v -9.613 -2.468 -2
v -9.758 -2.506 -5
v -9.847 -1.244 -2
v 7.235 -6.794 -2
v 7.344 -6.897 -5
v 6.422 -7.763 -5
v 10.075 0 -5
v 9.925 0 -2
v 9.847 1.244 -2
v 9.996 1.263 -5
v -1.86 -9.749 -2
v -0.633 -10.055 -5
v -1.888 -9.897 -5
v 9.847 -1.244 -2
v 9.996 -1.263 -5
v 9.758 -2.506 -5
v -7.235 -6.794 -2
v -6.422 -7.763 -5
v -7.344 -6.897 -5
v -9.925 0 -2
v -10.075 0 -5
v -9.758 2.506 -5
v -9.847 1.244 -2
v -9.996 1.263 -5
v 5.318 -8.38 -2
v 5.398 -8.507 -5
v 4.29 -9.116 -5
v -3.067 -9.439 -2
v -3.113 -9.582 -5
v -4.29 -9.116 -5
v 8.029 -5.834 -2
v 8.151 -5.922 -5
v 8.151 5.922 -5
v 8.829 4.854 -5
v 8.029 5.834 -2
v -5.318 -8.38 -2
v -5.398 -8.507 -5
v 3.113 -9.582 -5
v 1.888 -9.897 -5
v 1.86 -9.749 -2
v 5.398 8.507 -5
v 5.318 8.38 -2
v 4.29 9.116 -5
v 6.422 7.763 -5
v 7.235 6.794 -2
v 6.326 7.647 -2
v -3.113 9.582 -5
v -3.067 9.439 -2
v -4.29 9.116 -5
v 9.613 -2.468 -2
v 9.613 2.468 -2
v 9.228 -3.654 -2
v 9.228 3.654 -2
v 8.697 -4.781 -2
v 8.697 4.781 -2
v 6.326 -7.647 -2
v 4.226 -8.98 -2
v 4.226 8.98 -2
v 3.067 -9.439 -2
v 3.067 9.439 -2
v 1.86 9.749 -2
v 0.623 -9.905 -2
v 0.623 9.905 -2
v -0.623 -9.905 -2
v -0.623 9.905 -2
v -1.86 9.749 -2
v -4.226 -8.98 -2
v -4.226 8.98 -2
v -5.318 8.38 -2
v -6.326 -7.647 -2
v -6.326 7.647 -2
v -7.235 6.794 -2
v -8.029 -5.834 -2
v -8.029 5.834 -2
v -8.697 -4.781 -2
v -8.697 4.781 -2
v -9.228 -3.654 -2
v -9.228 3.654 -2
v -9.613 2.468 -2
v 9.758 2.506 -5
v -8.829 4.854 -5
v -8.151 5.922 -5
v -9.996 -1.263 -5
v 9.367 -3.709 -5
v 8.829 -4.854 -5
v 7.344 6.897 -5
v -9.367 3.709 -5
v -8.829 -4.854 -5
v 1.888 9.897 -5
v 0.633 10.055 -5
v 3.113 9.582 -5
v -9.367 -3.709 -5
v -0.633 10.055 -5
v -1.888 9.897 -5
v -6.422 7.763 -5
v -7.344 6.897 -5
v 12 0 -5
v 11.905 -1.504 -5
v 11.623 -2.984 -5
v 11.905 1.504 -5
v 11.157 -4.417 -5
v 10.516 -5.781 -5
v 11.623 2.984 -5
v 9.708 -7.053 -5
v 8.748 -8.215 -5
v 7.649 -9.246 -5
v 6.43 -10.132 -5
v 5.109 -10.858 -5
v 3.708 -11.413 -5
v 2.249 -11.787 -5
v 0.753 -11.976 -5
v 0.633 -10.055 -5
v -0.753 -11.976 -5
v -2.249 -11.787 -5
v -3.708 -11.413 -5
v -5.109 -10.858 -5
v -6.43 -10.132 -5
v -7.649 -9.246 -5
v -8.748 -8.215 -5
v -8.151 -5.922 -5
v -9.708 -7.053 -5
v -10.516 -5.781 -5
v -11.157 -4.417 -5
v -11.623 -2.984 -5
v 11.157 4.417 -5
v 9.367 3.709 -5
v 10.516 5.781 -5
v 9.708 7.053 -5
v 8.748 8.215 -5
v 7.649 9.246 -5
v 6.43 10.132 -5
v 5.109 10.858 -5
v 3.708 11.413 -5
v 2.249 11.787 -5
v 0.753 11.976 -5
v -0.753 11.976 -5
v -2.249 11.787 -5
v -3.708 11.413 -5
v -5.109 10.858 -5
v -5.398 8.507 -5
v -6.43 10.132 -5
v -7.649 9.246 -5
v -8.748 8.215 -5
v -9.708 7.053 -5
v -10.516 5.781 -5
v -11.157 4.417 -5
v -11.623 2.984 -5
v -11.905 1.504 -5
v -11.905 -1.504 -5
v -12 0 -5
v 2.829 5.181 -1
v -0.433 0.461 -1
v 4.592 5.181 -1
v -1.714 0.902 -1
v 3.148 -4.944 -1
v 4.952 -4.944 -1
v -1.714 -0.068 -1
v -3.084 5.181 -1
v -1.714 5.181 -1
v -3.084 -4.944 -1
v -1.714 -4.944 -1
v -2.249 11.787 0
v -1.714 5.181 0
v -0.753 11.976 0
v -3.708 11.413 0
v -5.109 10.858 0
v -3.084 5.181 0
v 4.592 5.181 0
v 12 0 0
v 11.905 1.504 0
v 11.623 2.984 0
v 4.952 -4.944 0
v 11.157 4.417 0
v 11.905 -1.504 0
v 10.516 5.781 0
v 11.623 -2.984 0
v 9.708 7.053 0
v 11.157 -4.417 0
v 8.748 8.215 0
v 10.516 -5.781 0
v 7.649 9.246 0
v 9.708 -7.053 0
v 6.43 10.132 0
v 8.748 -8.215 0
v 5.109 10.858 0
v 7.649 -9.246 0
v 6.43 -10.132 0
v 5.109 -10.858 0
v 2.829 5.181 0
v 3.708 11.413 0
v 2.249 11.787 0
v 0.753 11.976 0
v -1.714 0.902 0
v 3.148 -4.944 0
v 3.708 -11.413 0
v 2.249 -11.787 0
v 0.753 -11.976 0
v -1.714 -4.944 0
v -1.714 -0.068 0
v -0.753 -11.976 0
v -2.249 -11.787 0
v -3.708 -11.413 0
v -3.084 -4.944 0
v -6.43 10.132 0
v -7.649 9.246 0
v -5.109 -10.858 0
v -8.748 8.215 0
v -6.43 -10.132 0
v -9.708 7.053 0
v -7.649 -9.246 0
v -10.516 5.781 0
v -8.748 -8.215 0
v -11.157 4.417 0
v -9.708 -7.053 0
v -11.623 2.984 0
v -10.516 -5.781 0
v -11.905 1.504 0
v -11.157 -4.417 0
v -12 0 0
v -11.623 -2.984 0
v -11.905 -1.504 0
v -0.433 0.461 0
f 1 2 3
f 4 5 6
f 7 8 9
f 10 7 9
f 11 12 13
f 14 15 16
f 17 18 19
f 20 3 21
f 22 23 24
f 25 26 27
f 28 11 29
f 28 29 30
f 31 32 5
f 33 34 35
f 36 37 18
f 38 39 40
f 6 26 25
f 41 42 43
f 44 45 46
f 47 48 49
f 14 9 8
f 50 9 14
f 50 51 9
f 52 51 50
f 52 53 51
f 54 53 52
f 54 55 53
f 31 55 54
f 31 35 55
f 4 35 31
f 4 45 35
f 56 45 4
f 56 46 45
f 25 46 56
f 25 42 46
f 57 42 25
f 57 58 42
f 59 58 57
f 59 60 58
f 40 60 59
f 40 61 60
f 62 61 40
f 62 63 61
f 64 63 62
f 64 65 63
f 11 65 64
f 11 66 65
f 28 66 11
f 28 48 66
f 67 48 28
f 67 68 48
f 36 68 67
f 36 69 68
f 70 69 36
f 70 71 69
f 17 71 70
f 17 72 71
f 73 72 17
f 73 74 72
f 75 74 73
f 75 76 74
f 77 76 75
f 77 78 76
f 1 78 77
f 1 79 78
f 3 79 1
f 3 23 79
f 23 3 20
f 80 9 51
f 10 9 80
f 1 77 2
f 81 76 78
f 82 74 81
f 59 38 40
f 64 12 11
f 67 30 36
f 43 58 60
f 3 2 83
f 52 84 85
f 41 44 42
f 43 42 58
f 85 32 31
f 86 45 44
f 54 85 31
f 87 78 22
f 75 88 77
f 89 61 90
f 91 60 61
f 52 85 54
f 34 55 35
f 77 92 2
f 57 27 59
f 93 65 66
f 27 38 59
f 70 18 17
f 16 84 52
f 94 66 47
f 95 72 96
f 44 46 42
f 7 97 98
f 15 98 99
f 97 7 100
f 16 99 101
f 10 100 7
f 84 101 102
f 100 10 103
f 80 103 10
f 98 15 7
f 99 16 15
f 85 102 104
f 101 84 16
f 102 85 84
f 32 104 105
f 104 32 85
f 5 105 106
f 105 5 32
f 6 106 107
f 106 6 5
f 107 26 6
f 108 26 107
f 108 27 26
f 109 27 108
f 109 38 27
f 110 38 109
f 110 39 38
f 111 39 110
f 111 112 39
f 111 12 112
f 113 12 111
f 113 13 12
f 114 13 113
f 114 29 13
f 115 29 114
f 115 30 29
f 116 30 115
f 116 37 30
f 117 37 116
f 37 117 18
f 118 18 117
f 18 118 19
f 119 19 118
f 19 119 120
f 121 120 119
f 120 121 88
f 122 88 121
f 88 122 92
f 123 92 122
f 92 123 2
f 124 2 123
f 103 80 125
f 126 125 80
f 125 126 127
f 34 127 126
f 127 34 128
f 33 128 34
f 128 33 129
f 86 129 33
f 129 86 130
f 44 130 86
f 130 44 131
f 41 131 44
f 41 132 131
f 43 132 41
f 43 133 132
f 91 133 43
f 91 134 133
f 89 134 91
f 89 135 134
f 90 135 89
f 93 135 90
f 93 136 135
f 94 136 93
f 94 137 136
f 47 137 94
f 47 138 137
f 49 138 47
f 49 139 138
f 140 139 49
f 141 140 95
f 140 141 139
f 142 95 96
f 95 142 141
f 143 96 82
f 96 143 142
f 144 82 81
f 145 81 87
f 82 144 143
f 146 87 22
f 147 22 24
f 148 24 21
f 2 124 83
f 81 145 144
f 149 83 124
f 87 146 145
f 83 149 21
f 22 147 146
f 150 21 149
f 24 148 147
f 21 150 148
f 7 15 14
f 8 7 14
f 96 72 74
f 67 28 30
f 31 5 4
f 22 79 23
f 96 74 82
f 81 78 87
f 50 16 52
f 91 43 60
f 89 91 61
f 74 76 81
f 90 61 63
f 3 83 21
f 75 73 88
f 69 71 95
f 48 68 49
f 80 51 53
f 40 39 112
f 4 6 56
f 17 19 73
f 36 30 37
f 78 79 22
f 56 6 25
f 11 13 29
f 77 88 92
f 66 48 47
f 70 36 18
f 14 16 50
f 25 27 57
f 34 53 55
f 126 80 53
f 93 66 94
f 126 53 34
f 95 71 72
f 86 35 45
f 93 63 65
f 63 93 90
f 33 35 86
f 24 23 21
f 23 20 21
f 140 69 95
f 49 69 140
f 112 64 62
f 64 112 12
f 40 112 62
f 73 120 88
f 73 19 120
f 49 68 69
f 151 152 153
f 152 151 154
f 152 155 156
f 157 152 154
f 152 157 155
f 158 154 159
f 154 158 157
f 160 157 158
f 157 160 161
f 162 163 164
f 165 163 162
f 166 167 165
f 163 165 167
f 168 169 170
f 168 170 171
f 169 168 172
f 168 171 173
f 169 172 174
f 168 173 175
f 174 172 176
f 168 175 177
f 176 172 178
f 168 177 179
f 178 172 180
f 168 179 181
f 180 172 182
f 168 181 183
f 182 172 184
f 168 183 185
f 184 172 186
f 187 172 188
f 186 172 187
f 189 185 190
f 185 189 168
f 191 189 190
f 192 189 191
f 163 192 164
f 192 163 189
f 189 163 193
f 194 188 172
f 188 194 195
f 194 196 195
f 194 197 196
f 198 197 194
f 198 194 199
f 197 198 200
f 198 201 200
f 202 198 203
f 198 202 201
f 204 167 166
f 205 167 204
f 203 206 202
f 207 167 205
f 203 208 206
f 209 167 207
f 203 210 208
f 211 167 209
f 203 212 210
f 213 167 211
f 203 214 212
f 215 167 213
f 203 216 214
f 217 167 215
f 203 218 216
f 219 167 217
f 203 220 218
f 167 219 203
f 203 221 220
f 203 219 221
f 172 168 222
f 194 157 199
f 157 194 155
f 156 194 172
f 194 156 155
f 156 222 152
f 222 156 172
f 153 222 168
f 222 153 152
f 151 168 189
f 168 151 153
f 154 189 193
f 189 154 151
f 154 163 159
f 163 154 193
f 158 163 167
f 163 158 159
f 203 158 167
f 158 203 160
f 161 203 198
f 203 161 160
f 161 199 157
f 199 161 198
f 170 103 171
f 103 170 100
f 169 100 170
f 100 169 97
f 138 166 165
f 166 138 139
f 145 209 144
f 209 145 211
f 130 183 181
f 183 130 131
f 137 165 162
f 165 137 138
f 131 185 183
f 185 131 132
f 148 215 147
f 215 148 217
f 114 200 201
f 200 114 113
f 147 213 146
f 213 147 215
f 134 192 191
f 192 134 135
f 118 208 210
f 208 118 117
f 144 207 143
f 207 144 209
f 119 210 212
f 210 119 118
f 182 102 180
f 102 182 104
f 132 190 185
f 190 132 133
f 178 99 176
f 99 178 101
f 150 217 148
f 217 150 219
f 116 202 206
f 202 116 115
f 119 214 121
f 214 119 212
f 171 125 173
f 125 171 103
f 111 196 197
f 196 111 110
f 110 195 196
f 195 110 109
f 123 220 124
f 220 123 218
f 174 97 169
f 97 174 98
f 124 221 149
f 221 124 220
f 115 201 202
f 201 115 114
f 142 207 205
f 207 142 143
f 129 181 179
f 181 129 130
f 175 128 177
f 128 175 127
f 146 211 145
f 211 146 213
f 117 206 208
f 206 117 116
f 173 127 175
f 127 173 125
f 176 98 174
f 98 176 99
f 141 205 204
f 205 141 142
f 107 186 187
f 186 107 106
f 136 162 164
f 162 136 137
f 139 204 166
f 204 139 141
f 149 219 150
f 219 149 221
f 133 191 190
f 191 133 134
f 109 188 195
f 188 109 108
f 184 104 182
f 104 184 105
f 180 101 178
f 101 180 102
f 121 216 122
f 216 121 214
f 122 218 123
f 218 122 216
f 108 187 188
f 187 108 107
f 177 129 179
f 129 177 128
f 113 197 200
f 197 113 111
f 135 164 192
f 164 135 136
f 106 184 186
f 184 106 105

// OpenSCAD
$fn = 50;

difference() {
	union() {
		translate(v = [0, 0, -5.0]) {
			cylinder(h = 5, r = 12.0);
		}
	}
	union() {
		#translate(v = [0, 0, -5.0]) {
			cylinder(h = 3, r1 = 10.075, r2 = 9.925);
		}
		translate(v = [0, 0, -1]) {
			linear_extrude(height = 1) {
				text(font = "Impact", halign = "center", size = 10, text = "K", valign = "center");
			}
		}
	}
}
